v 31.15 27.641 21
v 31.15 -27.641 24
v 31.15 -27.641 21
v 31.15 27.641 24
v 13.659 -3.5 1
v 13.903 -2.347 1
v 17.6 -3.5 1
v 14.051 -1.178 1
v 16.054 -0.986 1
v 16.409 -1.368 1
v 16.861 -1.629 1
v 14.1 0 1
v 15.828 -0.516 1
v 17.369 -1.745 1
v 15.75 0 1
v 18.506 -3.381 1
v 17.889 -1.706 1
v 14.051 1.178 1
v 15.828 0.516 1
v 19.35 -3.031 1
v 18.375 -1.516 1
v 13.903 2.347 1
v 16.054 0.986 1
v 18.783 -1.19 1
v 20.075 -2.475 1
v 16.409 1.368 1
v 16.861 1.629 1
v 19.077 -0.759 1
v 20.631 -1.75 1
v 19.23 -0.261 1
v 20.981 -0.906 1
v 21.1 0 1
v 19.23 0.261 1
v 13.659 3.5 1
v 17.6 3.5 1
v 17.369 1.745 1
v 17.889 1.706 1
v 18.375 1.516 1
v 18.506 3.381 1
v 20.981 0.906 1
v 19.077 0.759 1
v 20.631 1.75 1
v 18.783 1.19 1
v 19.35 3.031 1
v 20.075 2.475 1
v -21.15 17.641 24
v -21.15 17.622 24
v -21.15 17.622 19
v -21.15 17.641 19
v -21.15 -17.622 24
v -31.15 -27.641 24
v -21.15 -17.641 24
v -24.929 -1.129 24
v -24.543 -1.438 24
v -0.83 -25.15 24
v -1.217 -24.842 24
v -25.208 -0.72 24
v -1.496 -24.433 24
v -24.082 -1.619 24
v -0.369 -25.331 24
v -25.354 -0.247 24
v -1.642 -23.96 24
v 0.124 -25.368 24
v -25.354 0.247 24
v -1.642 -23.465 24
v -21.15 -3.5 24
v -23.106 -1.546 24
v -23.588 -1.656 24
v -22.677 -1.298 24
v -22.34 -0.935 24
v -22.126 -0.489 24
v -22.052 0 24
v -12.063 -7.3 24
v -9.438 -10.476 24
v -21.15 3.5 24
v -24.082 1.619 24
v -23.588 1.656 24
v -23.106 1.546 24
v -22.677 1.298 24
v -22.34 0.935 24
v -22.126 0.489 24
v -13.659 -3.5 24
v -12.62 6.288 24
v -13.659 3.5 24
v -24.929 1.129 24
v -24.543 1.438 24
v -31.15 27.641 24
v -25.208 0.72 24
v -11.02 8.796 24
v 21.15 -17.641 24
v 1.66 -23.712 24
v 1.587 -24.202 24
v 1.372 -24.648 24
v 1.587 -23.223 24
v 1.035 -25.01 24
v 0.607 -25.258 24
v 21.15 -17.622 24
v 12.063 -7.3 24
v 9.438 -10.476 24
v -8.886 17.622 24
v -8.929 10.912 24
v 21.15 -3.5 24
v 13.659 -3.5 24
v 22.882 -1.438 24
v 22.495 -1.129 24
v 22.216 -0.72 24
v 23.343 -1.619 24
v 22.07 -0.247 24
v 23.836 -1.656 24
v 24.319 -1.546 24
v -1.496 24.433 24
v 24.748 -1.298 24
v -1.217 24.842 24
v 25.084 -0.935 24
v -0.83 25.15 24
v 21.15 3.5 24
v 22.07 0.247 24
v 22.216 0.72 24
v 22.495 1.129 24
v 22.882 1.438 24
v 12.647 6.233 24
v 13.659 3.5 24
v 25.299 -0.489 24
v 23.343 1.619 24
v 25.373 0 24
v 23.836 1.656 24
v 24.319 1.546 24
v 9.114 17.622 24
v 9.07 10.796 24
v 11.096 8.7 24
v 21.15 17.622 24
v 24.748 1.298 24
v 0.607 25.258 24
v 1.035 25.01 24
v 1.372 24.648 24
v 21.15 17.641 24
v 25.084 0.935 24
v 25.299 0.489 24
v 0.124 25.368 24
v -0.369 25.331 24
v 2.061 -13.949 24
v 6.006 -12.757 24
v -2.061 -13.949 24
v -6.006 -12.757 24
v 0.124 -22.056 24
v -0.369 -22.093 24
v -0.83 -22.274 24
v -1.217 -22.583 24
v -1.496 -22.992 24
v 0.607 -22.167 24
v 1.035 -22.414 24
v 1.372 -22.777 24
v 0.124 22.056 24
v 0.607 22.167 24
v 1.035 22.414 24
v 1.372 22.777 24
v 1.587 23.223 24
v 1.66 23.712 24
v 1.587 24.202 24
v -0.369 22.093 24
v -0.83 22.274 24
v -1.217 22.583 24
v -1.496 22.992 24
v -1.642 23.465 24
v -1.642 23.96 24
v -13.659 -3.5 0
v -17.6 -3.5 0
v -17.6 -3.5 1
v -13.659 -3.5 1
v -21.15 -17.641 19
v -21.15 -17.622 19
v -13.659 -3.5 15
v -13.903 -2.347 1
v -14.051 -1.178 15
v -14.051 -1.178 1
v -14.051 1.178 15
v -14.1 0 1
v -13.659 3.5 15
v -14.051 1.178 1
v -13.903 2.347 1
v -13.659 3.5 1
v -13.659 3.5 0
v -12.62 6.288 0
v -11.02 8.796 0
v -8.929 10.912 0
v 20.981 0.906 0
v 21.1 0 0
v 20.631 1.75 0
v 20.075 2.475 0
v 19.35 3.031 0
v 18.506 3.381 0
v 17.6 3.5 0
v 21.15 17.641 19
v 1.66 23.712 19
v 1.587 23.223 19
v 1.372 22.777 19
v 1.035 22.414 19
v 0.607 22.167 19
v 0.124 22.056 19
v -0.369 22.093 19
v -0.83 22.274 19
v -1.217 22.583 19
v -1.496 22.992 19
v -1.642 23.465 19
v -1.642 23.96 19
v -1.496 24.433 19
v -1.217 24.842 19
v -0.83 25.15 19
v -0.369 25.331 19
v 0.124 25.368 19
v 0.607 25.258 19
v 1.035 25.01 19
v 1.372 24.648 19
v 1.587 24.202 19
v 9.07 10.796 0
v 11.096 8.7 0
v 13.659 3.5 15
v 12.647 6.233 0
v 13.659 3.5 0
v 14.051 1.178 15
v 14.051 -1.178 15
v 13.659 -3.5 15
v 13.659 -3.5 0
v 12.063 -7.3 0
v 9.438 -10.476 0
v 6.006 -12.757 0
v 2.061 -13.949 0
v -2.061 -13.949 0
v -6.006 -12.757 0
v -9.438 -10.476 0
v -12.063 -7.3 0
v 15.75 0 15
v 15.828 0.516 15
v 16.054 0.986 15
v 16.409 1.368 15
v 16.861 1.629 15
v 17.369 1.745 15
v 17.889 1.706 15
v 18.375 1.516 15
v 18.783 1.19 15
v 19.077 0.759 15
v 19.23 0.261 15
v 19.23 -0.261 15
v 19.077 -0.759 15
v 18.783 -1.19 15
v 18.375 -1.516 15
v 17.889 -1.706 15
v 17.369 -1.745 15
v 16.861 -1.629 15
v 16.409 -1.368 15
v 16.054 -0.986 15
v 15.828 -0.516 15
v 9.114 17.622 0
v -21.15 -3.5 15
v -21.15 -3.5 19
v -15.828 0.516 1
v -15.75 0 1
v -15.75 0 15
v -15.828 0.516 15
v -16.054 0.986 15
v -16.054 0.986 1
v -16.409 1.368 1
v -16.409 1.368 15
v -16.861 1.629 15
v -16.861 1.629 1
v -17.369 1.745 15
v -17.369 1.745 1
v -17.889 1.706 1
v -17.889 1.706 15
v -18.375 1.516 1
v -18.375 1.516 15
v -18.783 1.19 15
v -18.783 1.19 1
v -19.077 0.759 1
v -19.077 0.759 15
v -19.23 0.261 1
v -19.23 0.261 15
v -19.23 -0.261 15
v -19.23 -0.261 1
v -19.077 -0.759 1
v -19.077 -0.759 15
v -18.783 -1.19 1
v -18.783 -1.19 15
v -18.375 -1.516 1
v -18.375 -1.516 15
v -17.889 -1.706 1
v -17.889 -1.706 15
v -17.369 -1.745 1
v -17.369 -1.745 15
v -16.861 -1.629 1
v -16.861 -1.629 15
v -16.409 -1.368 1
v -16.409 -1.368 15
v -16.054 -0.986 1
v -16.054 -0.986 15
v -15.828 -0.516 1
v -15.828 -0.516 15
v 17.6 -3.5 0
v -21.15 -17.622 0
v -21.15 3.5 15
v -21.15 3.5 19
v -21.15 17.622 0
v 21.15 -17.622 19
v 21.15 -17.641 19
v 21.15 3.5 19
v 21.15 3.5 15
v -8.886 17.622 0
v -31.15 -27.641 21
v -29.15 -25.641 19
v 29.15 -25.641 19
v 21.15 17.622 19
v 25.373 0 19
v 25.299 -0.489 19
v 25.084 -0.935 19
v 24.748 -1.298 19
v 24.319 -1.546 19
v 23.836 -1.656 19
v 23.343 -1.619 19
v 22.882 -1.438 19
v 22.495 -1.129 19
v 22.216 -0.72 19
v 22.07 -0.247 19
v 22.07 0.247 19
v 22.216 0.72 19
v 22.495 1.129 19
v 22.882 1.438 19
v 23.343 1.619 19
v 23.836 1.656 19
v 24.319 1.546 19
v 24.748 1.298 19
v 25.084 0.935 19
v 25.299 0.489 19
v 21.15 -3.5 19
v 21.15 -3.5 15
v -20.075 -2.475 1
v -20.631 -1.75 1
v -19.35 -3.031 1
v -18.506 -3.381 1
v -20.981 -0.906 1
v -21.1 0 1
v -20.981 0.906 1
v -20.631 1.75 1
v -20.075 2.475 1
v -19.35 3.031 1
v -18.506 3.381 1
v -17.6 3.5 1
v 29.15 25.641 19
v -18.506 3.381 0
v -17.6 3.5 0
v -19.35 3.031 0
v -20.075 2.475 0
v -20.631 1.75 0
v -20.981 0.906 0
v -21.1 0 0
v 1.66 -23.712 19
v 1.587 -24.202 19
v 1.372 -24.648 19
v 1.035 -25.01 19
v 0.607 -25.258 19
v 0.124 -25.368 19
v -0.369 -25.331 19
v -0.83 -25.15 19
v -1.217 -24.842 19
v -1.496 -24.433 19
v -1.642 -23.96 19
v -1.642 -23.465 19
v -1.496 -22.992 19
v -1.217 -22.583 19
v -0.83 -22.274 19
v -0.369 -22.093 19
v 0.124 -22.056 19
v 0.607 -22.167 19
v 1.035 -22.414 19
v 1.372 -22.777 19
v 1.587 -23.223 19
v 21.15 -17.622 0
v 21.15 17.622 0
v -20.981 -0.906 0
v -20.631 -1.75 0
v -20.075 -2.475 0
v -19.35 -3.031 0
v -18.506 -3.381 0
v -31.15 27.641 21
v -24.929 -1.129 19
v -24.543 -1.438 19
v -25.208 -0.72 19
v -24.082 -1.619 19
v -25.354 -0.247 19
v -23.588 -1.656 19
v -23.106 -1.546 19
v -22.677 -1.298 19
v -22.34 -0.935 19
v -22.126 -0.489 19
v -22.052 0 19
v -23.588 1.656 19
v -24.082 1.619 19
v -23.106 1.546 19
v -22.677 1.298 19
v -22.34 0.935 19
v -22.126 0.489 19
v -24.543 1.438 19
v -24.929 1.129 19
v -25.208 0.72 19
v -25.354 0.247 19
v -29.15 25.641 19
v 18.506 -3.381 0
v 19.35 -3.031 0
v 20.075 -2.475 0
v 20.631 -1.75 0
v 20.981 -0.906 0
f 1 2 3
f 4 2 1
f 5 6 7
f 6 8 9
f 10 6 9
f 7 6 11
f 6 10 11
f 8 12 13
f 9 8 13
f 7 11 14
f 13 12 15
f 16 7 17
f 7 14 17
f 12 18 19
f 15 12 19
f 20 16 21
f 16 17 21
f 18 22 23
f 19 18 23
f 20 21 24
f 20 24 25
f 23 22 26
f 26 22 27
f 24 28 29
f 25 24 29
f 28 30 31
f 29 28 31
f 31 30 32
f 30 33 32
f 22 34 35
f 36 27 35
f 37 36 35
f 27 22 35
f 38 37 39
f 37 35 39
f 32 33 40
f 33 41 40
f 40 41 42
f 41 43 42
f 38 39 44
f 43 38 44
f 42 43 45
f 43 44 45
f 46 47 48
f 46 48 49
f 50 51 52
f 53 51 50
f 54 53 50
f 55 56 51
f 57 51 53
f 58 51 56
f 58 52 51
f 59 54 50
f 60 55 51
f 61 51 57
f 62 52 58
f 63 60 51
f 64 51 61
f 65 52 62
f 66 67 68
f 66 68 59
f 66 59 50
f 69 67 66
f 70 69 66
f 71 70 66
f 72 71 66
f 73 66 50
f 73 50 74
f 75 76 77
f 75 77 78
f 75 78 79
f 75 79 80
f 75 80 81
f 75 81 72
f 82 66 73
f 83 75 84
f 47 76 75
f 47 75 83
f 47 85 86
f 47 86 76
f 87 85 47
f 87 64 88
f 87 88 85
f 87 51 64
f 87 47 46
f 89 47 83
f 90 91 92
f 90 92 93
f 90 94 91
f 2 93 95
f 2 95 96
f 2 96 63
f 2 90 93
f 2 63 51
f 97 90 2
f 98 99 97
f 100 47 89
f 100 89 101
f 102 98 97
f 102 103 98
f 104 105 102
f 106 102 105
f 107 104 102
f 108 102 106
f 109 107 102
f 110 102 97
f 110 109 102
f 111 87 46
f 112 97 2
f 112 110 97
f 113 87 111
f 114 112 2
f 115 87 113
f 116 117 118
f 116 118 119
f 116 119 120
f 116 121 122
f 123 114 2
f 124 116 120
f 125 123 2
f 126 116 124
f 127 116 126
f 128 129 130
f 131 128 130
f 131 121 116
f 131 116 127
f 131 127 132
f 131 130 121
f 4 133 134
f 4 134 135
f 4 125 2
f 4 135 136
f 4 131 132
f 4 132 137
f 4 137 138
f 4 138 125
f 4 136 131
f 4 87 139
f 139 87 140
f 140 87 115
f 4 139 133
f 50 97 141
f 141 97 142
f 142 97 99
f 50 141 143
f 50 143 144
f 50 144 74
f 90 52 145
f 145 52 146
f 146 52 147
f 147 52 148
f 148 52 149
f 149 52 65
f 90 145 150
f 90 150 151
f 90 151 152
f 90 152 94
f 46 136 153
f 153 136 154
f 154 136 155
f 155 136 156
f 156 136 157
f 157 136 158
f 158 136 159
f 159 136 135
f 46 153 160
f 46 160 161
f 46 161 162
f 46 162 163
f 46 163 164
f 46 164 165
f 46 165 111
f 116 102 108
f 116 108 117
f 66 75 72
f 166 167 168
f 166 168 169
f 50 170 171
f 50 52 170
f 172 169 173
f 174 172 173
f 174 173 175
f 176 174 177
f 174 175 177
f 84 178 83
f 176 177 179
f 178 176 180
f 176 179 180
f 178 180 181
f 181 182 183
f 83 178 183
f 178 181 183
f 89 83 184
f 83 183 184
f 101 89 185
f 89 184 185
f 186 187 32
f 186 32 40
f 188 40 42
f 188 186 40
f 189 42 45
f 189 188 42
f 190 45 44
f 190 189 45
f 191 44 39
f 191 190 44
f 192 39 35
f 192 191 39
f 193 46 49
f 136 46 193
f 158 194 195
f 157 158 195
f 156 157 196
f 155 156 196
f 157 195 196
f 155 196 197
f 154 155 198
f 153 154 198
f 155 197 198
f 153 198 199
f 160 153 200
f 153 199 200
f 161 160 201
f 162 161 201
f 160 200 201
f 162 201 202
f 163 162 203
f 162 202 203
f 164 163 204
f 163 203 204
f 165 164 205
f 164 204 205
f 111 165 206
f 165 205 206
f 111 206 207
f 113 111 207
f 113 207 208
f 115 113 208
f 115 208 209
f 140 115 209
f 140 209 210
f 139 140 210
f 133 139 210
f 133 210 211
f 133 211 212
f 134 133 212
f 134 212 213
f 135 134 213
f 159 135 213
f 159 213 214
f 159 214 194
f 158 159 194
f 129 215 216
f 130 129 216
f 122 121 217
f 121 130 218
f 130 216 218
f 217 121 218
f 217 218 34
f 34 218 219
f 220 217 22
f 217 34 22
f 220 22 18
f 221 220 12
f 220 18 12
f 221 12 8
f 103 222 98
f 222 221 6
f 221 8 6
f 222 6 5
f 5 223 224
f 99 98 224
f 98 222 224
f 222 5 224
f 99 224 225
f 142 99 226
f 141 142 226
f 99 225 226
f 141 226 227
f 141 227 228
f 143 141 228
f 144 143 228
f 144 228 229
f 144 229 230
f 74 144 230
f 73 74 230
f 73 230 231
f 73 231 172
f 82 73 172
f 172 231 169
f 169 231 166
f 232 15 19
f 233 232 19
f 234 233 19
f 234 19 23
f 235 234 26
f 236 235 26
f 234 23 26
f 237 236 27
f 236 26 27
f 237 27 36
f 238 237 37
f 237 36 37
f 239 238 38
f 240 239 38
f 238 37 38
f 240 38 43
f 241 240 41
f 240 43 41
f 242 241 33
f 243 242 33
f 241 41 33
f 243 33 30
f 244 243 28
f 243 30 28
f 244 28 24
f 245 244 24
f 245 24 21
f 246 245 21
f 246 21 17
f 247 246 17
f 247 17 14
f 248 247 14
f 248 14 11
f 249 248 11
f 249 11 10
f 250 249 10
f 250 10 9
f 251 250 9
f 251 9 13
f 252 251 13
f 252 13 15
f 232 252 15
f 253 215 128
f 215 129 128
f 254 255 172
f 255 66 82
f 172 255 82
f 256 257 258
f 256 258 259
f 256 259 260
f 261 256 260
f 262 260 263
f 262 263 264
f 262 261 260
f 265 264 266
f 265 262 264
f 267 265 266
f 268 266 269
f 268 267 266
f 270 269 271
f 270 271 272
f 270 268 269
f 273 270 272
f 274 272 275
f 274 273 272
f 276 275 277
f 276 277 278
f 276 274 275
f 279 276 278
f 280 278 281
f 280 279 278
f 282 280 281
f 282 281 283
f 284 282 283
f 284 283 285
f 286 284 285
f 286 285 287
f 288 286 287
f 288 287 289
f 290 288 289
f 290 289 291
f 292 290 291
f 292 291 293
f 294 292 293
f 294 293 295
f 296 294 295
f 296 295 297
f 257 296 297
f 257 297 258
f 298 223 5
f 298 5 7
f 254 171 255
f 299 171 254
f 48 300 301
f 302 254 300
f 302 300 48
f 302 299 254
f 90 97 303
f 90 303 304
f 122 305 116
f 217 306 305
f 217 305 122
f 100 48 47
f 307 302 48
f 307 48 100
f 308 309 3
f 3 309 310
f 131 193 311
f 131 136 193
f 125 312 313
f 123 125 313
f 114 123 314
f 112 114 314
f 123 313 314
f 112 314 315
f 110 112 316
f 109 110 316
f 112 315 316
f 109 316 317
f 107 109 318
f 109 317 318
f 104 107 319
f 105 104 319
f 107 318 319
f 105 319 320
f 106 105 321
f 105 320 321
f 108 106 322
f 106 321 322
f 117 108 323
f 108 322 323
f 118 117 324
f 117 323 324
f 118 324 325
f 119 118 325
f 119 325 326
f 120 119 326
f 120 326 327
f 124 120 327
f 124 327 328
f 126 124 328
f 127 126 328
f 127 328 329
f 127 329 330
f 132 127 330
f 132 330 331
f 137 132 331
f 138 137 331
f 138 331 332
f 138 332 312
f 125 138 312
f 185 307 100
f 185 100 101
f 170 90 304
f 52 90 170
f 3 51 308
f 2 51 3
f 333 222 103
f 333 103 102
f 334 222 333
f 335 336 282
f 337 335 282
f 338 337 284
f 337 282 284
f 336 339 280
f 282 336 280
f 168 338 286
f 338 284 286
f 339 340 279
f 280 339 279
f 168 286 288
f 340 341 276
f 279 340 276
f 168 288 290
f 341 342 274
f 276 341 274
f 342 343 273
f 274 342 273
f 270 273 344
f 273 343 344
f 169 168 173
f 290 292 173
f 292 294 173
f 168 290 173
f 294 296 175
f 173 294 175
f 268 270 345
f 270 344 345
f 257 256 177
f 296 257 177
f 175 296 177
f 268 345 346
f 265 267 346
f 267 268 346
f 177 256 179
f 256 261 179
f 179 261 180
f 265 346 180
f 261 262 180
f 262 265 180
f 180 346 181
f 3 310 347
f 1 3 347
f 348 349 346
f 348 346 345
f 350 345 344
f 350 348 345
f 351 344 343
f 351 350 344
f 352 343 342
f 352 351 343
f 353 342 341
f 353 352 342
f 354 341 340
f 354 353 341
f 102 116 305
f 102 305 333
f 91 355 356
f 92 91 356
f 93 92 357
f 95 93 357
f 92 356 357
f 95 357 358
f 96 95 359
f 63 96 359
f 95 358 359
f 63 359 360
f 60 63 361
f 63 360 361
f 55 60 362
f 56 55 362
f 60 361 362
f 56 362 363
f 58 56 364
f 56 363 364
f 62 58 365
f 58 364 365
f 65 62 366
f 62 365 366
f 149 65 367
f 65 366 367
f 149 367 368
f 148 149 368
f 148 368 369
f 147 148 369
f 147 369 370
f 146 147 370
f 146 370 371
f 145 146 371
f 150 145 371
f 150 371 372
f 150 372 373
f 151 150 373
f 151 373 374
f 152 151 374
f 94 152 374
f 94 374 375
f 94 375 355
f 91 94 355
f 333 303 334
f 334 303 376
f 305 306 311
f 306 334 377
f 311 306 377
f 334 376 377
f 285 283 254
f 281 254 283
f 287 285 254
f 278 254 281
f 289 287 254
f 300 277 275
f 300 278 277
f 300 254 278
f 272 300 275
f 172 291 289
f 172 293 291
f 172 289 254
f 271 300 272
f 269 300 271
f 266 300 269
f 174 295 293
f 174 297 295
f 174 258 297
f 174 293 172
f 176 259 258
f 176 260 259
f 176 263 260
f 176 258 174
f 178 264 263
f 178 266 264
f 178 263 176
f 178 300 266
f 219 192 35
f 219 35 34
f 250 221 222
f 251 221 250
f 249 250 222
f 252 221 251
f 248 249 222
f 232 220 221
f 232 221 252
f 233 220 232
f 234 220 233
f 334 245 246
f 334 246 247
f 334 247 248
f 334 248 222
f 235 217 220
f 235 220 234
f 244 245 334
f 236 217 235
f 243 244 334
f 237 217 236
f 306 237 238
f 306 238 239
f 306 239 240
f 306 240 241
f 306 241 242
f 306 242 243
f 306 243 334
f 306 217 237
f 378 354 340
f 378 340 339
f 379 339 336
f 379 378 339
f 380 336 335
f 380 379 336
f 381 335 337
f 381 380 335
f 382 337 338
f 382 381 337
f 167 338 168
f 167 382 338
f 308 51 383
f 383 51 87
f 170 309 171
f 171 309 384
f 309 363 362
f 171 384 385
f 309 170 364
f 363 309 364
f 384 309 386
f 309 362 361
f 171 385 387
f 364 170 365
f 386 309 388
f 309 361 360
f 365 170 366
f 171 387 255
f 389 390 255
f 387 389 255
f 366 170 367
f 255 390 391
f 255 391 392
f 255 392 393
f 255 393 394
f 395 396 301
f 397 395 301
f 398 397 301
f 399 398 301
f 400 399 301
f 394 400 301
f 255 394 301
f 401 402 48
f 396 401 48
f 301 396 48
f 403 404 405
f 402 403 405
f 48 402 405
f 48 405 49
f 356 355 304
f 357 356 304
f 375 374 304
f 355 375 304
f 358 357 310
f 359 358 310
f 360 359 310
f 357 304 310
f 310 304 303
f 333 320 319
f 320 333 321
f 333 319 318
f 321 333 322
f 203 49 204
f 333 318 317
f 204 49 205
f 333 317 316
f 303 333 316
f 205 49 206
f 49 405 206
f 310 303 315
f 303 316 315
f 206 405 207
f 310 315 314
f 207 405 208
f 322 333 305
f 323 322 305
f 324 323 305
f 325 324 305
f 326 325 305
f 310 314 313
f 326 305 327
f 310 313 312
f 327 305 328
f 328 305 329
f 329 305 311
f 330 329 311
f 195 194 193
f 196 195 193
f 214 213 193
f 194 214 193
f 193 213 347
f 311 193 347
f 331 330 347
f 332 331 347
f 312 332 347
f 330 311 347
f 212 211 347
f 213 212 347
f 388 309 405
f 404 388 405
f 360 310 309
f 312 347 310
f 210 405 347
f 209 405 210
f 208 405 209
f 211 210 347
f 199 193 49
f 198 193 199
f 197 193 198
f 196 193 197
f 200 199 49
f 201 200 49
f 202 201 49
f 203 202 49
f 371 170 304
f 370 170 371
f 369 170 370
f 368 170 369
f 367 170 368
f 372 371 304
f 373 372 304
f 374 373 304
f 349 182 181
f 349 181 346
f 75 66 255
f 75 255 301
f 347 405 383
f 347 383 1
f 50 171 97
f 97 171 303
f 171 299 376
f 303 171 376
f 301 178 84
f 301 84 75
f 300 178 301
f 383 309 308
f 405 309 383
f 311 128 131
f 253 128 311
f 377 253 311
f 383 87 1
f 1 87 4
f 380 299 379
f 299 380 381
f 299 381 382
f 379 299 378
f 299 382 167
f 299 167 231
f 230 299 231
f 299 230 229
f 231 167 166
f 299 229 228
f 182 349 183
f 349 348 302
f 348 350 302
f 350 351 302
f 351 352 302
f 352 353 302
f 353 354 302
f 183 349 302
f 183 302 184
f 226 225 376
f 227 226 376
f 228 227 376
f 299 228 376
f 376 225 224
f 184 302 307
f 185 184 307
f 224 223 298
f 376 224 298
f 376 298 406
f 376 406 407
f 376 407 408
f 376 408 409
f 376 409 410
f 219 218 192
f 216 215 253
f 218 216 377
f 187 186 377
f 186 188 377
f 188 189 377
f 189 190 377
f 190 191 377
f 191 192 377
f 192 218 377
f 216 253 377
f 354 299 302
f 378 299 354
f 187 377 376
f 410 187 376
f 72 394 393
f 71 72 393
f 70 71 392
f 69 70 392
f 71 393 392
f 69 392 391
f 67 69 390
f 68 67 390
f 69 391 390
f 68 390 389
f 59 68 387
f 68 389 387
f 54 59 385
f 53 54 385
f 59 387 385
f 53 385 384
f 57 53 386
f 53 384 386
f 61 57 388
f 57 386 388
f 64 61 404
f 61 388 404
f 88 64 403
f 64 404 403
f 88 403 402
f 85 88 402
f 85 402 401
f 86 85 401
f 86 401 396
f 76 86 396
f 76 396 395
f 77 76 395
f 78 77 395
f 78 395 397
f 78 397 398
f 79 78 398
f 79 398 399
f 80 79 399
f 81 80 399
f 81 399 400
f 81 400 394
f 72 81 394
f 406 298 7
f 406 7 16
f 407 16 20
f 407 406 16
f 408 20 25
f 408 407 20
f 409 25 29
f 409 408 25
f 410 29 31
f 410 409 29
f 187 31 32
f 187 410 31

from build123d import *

# Parameters (mm, degrees)
F0_W      = 42.3
F0_H      = 35.2431833744
F0_R      = 1.75
F1_DEPTH  = 20
F3_DEPTH  = 20
F4_DEPTH  = 1
F5_R      = 1.75
F6_DEPTH  = 5
F7_W      = 62.3000003397
F7_H      = 55.2812255919
F8_DEPTH  = 4
F9_DEPTH  = 1
F10_DEPTH = 4
F11_R     = 1.6604727816
F12_DEPTH = 6
F13_SIZE  = 2


with BuildPart() as f1:
    # F0 (on Top) → F1 (new body)
    with BuildSketch(Plane.XY):
        Rectangle(F0_W, F0_H)
        with BuildLine():
            ThreePointArc((-13.6586968632, 3.5), (0, 14.1), (13.6586968632, 3.5))
            Line((13.6586968632, 3.5), (17.6, 3.5))
            ThreePointArc((17.6, 3.5), (20.0748737342, 2.4748737342), (21.1, 0))
            ThreePointArc((21.1, 0), (20.0748737342, -2.4748737342), (17.6, -3.5))
            Line((17.6, -3.5), (13.6586968632, -3.5))
            ThreePointArc((13.6586968632, -3.5), (0, -14.1), (-13.6586968632, -3.5))
            Line((-13.6586968632, -3.5), (-17.6, -3.5))
            ThreePointArc((-17.6, -3.5), (-20.0748737342, -2.4748737342), (-21.1, 0))
            ThreePointArc((-21.1, 0), (-20.0748737342, 2.4748737342), (-17.6, 3.5))
            Line((-17.6, 3.5), (-13.6586968632, 3.5))
        make_face(mode=Mode.SUBTRACT)
        with BuildLine():
            ThreePointArc((-14.1, 0), (-13.9892391818, 1.7638557522), (-13.6586968632, 3.5))
            Line((-13.6586968632, 3.5), (-17.6, 3.5))
            ThreePointArc((-17.6, 3.5), (-20.0748737342, 2.4748737342), (-21.1, 0))
            ThreePointArc((-21.1, 0), (-20.0748737342, -2.4748737342), (-17.6, -3.5))
            Line((-17.6, -3.5), (-13.6586968632, -3.5))
            ThreePointArc((-13.6586968632, -3.5), (-13.9892391818, -1.7638557522), (-14.1, 0))
        make_face()
        with Locations((-17.5, 0)):
            Circle(F0_R, mode=Mode.SUBTRACT)
        with BuildLine():
            ThreePointArc((13.6586968632, 3.5), (13.9892391818, 1.7638557522), (14.1, 0))
            ThreePointArc((14.1, 0), (13.9892391818, -1.7638557522), (13.6586968632, -3.5))
            Line((13.6586968632, -3.5), (17.6, -3.5))
            ThreePointArc((17.6, -3.5), (20.0748737342, -2.4748737342), (21.1, 0))
            ThreePointArc((21.1, 0), (20.0748737342, 2.4748737342), (17.6, 3.5))
            Line((17.6, 3.5), (13.6586968632, 3.5))
        make_face()
        with BuildLine():
            ThreePointArc((19.25, 0), (17.5, -1.75), (15.75, 0))
            ThreePointArc((15.75, 0), (17.5, 1.75), (19.25, 0))
        make_face(mode=Mode.SUBTRACT)
    extrude(amount=F1_DEPTH)

    # F2 (on face) → F3 (cut)
    with BuildSketch(Plane.XY.offset(20)):
        with BuildLine():
            Line((9.1142978397, 17.6215916872), (-8.8857021603, 17.6215916872))
            Line((-8.8857021603, 17.6215916872), (-8.9292200042, 10.9123338529))
            ThreePointArc((-8.9292200042, 10.9123338529), (0.0914540337, 14.0997034068), (9.0700227445, 10.7955864784))
            Line((9.0700227445, 10.7955864784), (9.1142978397, 17.6215916872))
        make_face()
    extrude(amount=-F3_DEPTH, mode=Mode.SUBTRACT)

    # F0 (on Top) → F4 (cut)
    with BuildSketch(Plane.XY):
        with BuildLine():
            ThreePointArc((-14.1, 0), (-13.9892391818, 1.7638557522), (-13.6586968632, 3.5))
            Line((-13.6586968632, 3.5), (-17.6, 3.5))
            ThreePointArc((-17.6, 3.5), (-20.0748737342, 2.4748737342), (-21.1, 0))
            ThreePointArc((-21.1, 0), (-20.0748737342, -2.4748737342), (-17.6, -3.5))
            Line((-17.6, -3.5), (-13.6586968632, -3.5))
            ThreePointArc((-13.6586968632, -3.5), (-13.9892391818, -1.7638557522), (-14.1, 0))
        make_face()
        with Locations((-17.5, 0)):
            Circle(F0_R, mode=Mode.SUBTRACT)
        with BuildLine():
            ThreePointArc((13.6586968632, 3.5), (13.9892391818, 1.7638557522), (14.1, 0))
            ThreePointArc((14.1, 0), (13.9892391818, -1.7638557522), (13.6586968632, -3.5))
            Line((13.6586968632, -3.5), (17.6, -3.5))
            ThreePointArc((17.6, -3.5), (20.0748737342, -2.4748737342), (21.1, 0))
            ThreePointArc((21.1, 0), (20.0748737342, 2.4748737342), (17.6, 3.5))
            Line((17.6, 3.5), (13.6586968632, 3.5))
        make_face()
        with BuildLine():
            ThreePointArc((19.25, 0), (17.5, -1.75), (15.75, 0))
            ThreePointArc((15.75, 0), (17.5, 1.75), (19.25, 0))
        make_face(mode=Mode.SUBTRACT)
    extrude(amount=F4_DEPTH, mode=Mode.SUBTRACT)

    # F5 (on face) → F6 (cut)
    with BuildSketch(Plane.XY.offset(20)):
        with BuildLine():
            ThreePointArc((-13.6586968632, -3.5), (-14.1, 0), (-13.6586968632, 3.5))
            Line((-13.6586968632, 3.5), (-21.15, 3.5))
            Line((-21.15, 3.5), (-21.15, -3.5))
            Line((-21.15, -3.5), (-13.6586968632, -3.5))
        make_face()
        with Locations((-17.5, 0)):
            Circle(F5_R, mode=Mode.SUBTRACT)
        with BuildLine():
            Line((21.15, -3.5), (21.15, 3.5))
            Line((21.15, 3.5), (13.6586968632, 3.5))
            ThreePointArc((13.6586968632, 3.5), (14.1, 0), (13.6586968632, -3.5))
            Line((13.6586968632, -3.5), (21.15, -3.5))
        make_face()
        with Locations((17.5, 0)):
            Circle(F5_R, mode=Mode.SUBTRACT)
    extrude(amount=-F6_DEPTH, mode=Mode.SUBTRACT)

    # F10 (add): faces of the model
    f10_faces = [f1.faces().sort_by_distance(p)[0] for p in [
        (-15.655980784, 11.1858977237, 20),
        (15.7115170965, 11.1581962094, 20),
        (-20.704050524, -10.5607958436, 20),
    ]]


with BuildPart() as f8:
    # F7 (on face) → F8 (new body)
    with BuildSketch(Plane.XY.offset(20)):
        Rectangle(F7_W, F7_H)
        Polygon((-21.15, 17.6406126261), (21.15, 17.6406126261), (21.15, -17.6406126261), (-21.15, -17.6406126261), (-21.15, 3.5), (-21.15, 17.6215916872), align=None, mode=Mode.SUBTRACT)
    extrude(amount=F8_DEPTH)


with BuildPart() as f9:
    # F9 (new): a face of the model
    f9_faces = [f8.part.faces().sort_by_distance(p)[0] for p in [
        (0, -26.8077080028, 20),
    ]]
    extrude(f9_faces, amount=F9_DEPTH)


with BuildPart() as f1_1:
    add(f1.part)

    add(f8.part)  # F10 merges F8

    add(f9.part)  # F10 merges F9
    extrude(f10_faces, amount=F10_DEPTH)

    # F11 (on face) → F12 (cut)
    with BuildSketch(Plane(origin=(0, 0, 19), x_dir=(1, 0, 0), z_dir=(0, 0, -1))):
        with Locations((0, 23.7122699618)):
            Circle(F11_R)
        with Locations((23.7122699618, 0)):
            Circle(F11_R)
        with Locations((0, -23.7122699618)):
            Circle(F11_R)
        with Locations((-23.7122699618, 0)):
            Circle(F11_R)
    extrude(amount=-F12_DEPTH, mode=Mode.SUBTRACT)

    # F13
    f13_edges = [f1_1.edges().sort_by_distance(p)[0] for p in [
        (-31.15, 0, 19),
        (0, -27.640613, 19),
        (31.15, 0, 19),
        (0, 27.640613, 19),
    ]]
    chamfer(f13_edges, length=F13_SIZE)


solid = f1_1.part
